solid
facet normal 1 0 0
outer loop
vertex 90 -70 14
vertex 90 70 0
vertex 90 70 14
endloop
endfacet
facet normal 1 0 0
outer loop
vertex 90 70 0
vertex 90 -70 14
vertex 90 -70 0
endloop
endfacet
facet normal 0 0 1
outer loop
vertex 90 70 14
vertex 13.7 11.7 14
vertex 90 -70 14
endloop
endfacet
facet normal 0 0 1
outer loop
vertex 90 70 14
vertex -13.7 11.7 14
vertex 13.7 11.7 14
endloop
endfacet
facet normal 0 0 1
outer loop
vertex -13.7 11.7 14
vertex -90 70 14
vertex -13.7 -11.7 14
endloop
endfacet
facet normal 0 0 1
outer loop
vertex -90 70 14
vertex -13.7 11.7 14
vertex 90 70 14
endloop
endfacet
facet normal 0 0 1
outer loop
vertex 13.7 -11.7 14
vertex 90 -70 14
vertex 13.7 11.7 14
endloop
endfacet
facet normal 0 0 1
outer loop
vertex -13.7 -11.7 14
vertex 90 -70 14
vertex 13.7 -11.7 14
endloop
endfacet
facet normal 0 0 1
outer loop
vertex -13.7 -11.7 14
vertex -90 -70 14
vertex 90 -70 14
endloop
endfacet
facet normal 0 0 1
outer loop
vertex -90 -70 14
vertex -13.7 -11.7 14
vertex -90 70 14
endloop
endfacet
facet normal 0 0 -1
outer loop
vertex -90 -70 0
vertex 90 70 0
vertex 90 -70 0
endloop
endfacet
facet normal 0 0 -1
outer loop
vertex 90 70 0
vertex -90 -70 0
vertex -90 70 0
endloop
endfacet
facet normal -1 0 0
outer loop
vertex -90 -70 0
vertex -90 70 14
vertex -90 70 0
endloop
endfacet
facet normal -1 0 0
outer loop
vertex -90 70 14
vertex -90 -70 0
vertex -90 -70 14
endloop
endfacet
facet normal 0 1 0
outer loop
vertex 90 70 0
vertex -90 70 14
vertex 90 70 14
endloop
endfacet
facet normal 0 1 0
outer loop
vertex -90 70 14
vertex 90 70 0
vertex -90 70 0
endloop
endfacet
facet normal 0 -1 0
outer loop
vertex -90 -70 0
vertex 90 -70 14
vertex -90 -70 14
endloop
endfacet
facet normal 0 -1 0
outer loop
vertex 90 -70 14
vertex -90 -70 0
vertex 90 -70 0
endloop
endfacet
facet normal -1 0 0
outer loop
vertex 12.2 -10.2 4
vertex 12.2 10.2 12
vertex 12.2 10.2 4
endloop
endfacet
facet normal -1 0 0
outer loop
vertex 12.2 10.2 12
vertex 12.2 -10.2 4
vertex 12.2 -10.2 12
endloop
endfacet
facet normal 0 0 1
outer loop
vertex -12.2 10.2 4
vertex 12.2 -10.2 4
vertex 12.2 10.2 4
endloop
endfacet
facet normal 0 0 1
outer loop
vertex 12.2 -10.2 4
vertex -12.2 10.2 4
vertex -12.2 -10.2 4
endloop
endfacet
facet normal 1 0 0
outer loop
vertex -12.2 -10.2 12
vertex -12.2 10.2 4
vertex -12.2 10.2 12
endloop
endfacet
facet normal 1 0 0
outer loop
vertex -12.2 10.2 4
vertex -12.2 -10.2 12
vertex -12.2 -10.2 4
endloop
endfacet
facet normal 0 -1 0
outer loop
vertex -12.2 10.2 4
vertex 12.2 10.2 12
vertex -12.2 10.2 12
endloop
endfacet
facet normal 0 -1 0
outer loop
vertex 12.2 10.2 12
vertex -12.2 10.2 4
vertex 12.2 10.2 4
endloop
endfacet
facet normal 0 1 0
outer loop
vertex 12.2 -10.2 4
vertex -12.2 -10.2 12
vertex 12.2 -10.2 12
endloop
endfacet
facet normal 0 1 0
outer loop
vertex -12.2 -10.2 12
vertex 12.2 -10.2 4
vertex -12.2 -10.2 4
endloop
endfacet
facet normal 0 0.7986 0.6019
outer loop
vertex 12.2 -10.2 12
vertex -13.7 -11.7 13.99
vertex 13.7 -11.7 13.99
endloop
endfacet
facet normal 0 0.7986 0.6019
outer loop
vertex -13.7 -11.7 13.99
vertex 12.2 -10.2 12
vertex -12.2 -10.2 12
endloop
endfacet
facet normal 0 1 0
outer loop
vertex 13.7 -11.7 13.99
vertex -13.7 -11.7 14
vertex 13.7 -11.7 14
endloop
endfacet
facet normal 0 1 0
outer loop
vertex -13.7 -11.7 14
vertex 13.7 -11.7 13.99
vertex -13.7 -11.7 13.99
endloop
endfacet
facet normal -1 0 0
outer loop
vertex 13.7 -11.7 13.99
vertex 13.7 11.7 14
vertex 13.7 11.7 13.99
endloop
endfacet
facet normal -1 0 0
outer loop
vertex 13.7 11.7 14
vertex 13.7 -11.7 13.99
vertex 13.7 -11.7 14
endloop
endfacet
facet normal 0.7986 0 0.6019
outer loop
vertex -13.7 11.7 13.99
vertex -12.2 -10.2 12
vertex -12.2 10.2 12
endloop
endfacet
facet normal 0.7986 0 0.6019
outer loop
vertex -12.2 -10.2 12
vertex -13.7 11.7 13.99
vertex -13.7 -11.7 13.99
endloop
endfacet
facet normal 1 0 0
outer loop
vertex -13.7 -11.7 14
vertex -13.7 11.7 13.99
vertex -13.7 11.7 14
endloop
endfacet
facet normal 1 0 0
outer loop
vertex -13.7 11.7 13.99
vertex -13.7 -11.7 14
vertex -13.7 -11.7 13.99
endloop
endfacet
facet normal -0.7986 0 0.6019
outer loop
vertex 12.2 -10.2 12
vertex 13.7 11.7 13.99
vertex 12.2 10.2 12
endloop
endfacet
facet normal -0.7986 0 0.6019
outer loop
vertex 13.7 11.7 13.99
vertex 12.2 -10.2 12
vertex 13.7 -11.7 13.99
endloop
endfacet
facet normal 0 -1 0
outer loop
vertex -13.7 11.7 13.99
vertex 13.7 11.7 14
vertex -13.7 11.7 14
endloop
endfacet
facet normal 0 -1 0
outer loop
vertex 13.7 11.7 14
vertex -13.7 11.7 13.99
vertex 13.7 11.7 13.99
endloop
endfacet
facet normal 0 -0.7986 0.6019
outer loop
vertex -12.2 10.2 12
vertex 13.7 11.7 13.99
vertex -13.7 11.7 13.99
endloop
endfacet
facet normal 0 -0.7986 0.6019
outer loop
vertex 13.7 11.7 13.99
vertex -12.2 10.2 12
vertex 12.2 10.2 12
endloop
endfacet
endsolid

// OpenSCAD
// Headphone stand: base, post, hanger. Units mm. Print orientation = export orientation (+Z up).
part = "base"; // [base, post, hanger, assembly]
cadverify_only = "";

/* Parameters */
base_L = 180; base_W = 140; base_H = 14;
base_sock_L = 24.4; base_sock_W = 20.4; base_sock_D = 10; // depth from top
base_floor = base_H - base_sock_D; // 4
base_cham_H = 2; base_cham_extra = 1.5; // per side funnel

post_low_L = 24; post_low_W = 20; post_low_H = 10;
post_flare_H = 6;
post_shaft_L = 34; post_shaft_W = 28;
post_shaft_bot = post_low_H + post_flare_H; // 16
post_shaft_top = 230;
post_shaft_H = post_shaft_top - post_shaft_bot; // 214
post_up_L = 20; post_up_W = 16; post_up_H = 12;
post_up_cham_H = 1.5; post_up_cham_extra = 1.5; // per side taper at top
post_H = post_shaft_top + post_up_H; // 242

hanger_L = 120; hanger_W = 36; hanger_base_H = 14; hanger_R = 18; // half-cyl radius = W/2
hanger_cyl_H = 18; // cylinder peak 14+18=32
lip_L = 10; lip_W = 36; lip_bot = 14; lip_top = 36; // end stops 14..36
hanger_H = 36;
hanger_sock_L = 20.4; hanger_sock_W = 16.4; hanger_sock_D = 12; // straight depth from bottom
hanger_roof_H = 10; // triangular roof above straight, ridge along X
hanger_cham_H = 2; hanger_cham_extra = 1.5;

asm_post_Z = base_floor; // 4, post bottom in assembly
asm_hanger_Z = 234; // hanger bottom in assembly
// shaft top 230 + post bottom 4 = 234 = hanger bottom; tenon 230..242 -> hanger 0..12; hanger top 234+36=270

module instance(name, part, unit = 1) {
    echo(cadverify_instance = [name, part, unit]);
    if (cadverify_only == "" || cadverify_only == name) children();
}

module base_part() {
    difference() {
        translate([-base_L/2, -base_W/2, 0]) cube([base_L, base_W, base_H]);
        // straight socket
        translate([-base_sock_L/2, -base_sock_W/2, base_floor])
            cube([base_sock_L, base_sock_W, base_sock_D+0.01]);
        // entry funnel (frustum widening upward)
        hull() {
            translate([-base_sock_L/2, -base_sock_W/2, base_H-base_cham_H])
                cube([base_sock_L, base_sock_W, 0.01]);
            translate([-(base_sock_L/2+base_cham_extra), -(base_sock_W/2+base_cham_extra), base_H-0.01])
                cube([base_sock_L+2*base_cham_extra, base_sock_W+2*base_cham_extra, 0.01]);
        }
    }
}

module post_part() {
    // lower tenon (press fit into base)
    translate([-post_low_L/2, -post_low_W/2, 0]) cube([post_low_L, post_low_W, post_low_H]);
    // flare collar 45deg-compatible transition to shaft
    hull() {
        translate([-post_low_L/2, -post_low_W/2, post_low_H-0.01])
            cube([post_low_L, post_low_W, 0.01]);
        translate([-post_shaft_L/2, -post_shaft_W/2, post_shaft_bot-0.01])
            cube([post_shaft_L, post_shaft_W, 0.01]);
    }
    // shaft
    translate([-post_shaft_L/2, -post_shaft_W/2, post_shaft_bot])
        cube([post_shaft_L, post_shaft_W, post_shaft_H]);
    // upper tenon straight part
    translate([-post_up_L/2, -post_up_W/2, post_shaft_top])
        cube([post_up_L, post_up_W, post_up_H-post_up_cham_H]);
    // upper tenon lead chamfer (tapers inward going up)
    hull() {
        translate([-post_up_L/2, -post_up_W/2, post_H-post_up_cham_H-0.01])
            cube([post_up_L, post_up_W, 0.01]);
        translate([-(post_up_L/2-post_up_cham_extra), -(post_up_W/2-post_up_cham_extra), post_H-0.01])
            cube([post_up_L-2*post_up_cham_extra, post_up_W-2*post_up_cham_extra, 0.01]);
    }
}

module hanger_part() {
    difference() {
        union() {
            // base box
            translate([-hanger_L/2, -hanger_W/2, 0]) cube([hanger_L, hanger_W, hanger_base_H]);
            // rounded top: half cylinder along X
            intersection() {
                translate([0, 0, hanger_base_H]) rotate([0, 90, 0])
                    cylinder(r=hanger_R, h=hanger_L, center=true, $fn=128);
                translate([-hanger_L/2, -hanger_W/2, hanger_base_H]) cube([hanger_L, hanger_W, hanger_cyl_H]);
            }
            // end stops (full height from base top, no floating ledge)
            for (sx=[-1,1])
                translate([sx*(hanger_L/2-lip_L), -lip_W/2, lip_bot])
                    cube([lip_L, lip_W, lip_top-lip_bot]);
        }
        // straight socket
        translate([-hanger_sock_L/2, -hanger_sock_W/2, 0])
            cube([hanger_sock_L, hanger_sock_W, hanger_sock_D]);
        // entry funnel at mouth (widens downward)
        hull() {
            translate([-hanger_sock_L/2, -hanger_sock_W/2, hanger_cham_H])
                cube([hanger_sock_L, hanger_sock_W, 0.01]);
            translate([-(hanger_sock_L/2+hanger_cham_extra), -(hanger_sock_W/2+hanger_cham_extra), -0.01])
                cube([hanger_sock_L+2*hanger_cham_extra, hanger_sock_W+2*hanger_cham_extra, 0.01]);
        }
        // pointed roof above straight (ridge along X), self-supporting slopes
        // closed wedge: sharp apex edge, no flat -> no overhang patch
        polyhedron(
            points = [
                [-hanger_sock_L/2, -hanger_sock_W/2, hanger_sock_D-0.1],
                [ hanger_sock_L/2, -hanger_sock_W/2, hanger_sock_D-0.1],
                [ hanger_sock_L/2,  hanger_sock_W/2, hanger_sock_D-0.1],
                [-hanger_sock_L/2,  hanger_sock_W/2, hanger_sock_D-0.1],
                [-hanger_sock_L/2, 0, hanger_sock_D+hanger_roof_H],
                [ hanger_sock_L/2, 0, hanger_sock_D+hanger_roof_H]
            ],
            faces = [
                [0, 1, 2, 3],
                [1, 0, 4, 5],
                [2, 3, 4, 5],
                [0, 4, 3],
                [1, 2, 5]
            ]
        );
    }
}

// --- specs (print coords) ---
if (part == "base") {
    echo(cadverify_spec = [
        ["bounds", [[-base_L/2, -base_W/2, 0], [base_L/2, base_W/2, base_H]]],
        ["bodies", 1],
        ["through_holes", 0],
        ["support_faces", [["base_bottom", "-z", 20000]]],
        ["overhangs_allowed", []],
        ["copies", 1],
        ["details", [
            ["base_plate", "material", [[50, 40, 0], [80, 60, base_H]], 0.9],
            ["socket", "void", [[-base_sock_L/2, -base_sock_W/2, base_floor], [base_sock_L/2, base_sock_W/2, base_H]], 0.9],
            ["socket_funnel", "void", [[-(base_sock_L/2+base_cham_extra), -(base_sock_W/2+base_cham_extra), base_H-base_cham_H], [base_sock_L/2+base_cham_extra, base_sock_W/2+base_cham_extra, base_H]], 0.7],
            ["floor", "thickness", [0, 0, -1], [0, 0, 1], base_floor],
            ["top_face", "view", [[-60, -50, base_H-1], [60, 50, base_H+1]]]
        ]]
    ]);
    base_part();
} else if (part == "post") {
    echo(cadverify_spec = [
        ["bounds", [[-post_shaft_L/2, -post_shaft_W/2, 0], [post_shaft_L/2, post_shaft_W/2, post_H]]],
        ["bodies", 1],
        ["through_holes", 0],
        ["support_faces", [["post_bottom", "-z", 400]]],
        ["overhangs_allowed", []],
        ["copies", 1],
        ["details", [
            ["shaft", "material", [[-10, -8, 60], [10, 8, 160]], 0.9],
            ["lower_tenon", "material", [[-post_low_L/2, -post_low_W/2, 0], [post_low_L/2, post_low_W/2, post_low_H]], 0.9],
            ["upper_tenon", "material", [[-post_up_L/2, -post_up_W/2, post_shaft_top], [post_up_L/2, post_up_W/2, post_H]], 0.8],
            ["collar", "material", [[-14, -12, post_low_H], [14, 12, post_shaft_bot]], 0.7],
            ["shaft_wall", "thickness", [30, 0, 116], [-1, 0, 0], post_shaft_L],
            ["tenon_tip", "view", [[-post_up_L/2, -post_up_W/2, post_H-4], [post_up_L/2, post_up_W/2, post_H+1]]]
        ]]
    ]);
    post_part();
} else if (part == "hanger") {
    echo(cadverify_spec = [
        ["bounds", [[-hanger_L/2, -hanger_W/2, 0], [hanger_L/2, hanger_W/2, hanger_H]]],
        ["bodies", 1],
        ["through_holes", 0],
        ["support_faces", [["hanger_bottom", "-z", 3000]]],
        ["overhangs_allowed", []],
        ["copies", 1],
        ["details", [
            ["saddle", "material", [[-40, -8, 20], [40, 8, 26]], 0.9],
            ["end_stop", "material", [[hanger_L/2-lip_L, -lip_W/2, lip_bot], [hanger_L/2, lip_W/2, lip_top]], 0.9],
            ["socket", "void", [[-hanger_sock_L/2, -hanger_sock_W/2, 0], [hanger_sock_L/2, hanger_sock_W/2, hanger_sock_D]], 0.9],
            ["socket_funnel", "void", [[-(hanger_sock_L/2+hanger_cham_extra), -(hanger_sock_W/2+hanger_cham_extra), 0], [hanger_sock_L/2+hanger_cham_extra, hanger_sock_W/2+hanger_cham_extra, hanger_cham_H]], 0.7],
            ["top_skin", "thickness", [0, 0, hanger_H+4], [0, 0, -1], (hanger_base_H+hanger_cyl_H)-(hanger_sock_D+hanger_roof_H)],
            ["round_top", "view", [[-40, -hanger_W/2, hanger_base_H], [40, hanger_W/2, hanger_base_H+hanger_cyl_H+1]]]
        ]]
    ]);
    hanger_part();
} else if (part == "assembly") {
    echo(cadverify_spec = [
        ["bounds", [[-base_L/2, -base_W/2, 0], [base_L/2, base_W/2, asm_hanger_Z+hanger_H]]],
        ["support_faces", [["desk", "-z", 20000]]],
        ["allowed_interferences", []],
        ["motions", []],
        ["assembly_order", [
            [[ "base_inst" ], [0, 0, 0]],
            [[ "post_inst" ], [0, 0, -1]],
            [[ "hanger_inst" ], [0, 0, -1]]
        ]],
        ["overhangs_allowed", []]
    ]);
    instance("base_inst", "base") base_part();
    instance("post_inst", "post") translate([0, 0, asm_post_Z]) post_part();
    instance("hanger_inst", "hanger") translate([0, 0, asm_hanger_Z]) hanger_part();
}
